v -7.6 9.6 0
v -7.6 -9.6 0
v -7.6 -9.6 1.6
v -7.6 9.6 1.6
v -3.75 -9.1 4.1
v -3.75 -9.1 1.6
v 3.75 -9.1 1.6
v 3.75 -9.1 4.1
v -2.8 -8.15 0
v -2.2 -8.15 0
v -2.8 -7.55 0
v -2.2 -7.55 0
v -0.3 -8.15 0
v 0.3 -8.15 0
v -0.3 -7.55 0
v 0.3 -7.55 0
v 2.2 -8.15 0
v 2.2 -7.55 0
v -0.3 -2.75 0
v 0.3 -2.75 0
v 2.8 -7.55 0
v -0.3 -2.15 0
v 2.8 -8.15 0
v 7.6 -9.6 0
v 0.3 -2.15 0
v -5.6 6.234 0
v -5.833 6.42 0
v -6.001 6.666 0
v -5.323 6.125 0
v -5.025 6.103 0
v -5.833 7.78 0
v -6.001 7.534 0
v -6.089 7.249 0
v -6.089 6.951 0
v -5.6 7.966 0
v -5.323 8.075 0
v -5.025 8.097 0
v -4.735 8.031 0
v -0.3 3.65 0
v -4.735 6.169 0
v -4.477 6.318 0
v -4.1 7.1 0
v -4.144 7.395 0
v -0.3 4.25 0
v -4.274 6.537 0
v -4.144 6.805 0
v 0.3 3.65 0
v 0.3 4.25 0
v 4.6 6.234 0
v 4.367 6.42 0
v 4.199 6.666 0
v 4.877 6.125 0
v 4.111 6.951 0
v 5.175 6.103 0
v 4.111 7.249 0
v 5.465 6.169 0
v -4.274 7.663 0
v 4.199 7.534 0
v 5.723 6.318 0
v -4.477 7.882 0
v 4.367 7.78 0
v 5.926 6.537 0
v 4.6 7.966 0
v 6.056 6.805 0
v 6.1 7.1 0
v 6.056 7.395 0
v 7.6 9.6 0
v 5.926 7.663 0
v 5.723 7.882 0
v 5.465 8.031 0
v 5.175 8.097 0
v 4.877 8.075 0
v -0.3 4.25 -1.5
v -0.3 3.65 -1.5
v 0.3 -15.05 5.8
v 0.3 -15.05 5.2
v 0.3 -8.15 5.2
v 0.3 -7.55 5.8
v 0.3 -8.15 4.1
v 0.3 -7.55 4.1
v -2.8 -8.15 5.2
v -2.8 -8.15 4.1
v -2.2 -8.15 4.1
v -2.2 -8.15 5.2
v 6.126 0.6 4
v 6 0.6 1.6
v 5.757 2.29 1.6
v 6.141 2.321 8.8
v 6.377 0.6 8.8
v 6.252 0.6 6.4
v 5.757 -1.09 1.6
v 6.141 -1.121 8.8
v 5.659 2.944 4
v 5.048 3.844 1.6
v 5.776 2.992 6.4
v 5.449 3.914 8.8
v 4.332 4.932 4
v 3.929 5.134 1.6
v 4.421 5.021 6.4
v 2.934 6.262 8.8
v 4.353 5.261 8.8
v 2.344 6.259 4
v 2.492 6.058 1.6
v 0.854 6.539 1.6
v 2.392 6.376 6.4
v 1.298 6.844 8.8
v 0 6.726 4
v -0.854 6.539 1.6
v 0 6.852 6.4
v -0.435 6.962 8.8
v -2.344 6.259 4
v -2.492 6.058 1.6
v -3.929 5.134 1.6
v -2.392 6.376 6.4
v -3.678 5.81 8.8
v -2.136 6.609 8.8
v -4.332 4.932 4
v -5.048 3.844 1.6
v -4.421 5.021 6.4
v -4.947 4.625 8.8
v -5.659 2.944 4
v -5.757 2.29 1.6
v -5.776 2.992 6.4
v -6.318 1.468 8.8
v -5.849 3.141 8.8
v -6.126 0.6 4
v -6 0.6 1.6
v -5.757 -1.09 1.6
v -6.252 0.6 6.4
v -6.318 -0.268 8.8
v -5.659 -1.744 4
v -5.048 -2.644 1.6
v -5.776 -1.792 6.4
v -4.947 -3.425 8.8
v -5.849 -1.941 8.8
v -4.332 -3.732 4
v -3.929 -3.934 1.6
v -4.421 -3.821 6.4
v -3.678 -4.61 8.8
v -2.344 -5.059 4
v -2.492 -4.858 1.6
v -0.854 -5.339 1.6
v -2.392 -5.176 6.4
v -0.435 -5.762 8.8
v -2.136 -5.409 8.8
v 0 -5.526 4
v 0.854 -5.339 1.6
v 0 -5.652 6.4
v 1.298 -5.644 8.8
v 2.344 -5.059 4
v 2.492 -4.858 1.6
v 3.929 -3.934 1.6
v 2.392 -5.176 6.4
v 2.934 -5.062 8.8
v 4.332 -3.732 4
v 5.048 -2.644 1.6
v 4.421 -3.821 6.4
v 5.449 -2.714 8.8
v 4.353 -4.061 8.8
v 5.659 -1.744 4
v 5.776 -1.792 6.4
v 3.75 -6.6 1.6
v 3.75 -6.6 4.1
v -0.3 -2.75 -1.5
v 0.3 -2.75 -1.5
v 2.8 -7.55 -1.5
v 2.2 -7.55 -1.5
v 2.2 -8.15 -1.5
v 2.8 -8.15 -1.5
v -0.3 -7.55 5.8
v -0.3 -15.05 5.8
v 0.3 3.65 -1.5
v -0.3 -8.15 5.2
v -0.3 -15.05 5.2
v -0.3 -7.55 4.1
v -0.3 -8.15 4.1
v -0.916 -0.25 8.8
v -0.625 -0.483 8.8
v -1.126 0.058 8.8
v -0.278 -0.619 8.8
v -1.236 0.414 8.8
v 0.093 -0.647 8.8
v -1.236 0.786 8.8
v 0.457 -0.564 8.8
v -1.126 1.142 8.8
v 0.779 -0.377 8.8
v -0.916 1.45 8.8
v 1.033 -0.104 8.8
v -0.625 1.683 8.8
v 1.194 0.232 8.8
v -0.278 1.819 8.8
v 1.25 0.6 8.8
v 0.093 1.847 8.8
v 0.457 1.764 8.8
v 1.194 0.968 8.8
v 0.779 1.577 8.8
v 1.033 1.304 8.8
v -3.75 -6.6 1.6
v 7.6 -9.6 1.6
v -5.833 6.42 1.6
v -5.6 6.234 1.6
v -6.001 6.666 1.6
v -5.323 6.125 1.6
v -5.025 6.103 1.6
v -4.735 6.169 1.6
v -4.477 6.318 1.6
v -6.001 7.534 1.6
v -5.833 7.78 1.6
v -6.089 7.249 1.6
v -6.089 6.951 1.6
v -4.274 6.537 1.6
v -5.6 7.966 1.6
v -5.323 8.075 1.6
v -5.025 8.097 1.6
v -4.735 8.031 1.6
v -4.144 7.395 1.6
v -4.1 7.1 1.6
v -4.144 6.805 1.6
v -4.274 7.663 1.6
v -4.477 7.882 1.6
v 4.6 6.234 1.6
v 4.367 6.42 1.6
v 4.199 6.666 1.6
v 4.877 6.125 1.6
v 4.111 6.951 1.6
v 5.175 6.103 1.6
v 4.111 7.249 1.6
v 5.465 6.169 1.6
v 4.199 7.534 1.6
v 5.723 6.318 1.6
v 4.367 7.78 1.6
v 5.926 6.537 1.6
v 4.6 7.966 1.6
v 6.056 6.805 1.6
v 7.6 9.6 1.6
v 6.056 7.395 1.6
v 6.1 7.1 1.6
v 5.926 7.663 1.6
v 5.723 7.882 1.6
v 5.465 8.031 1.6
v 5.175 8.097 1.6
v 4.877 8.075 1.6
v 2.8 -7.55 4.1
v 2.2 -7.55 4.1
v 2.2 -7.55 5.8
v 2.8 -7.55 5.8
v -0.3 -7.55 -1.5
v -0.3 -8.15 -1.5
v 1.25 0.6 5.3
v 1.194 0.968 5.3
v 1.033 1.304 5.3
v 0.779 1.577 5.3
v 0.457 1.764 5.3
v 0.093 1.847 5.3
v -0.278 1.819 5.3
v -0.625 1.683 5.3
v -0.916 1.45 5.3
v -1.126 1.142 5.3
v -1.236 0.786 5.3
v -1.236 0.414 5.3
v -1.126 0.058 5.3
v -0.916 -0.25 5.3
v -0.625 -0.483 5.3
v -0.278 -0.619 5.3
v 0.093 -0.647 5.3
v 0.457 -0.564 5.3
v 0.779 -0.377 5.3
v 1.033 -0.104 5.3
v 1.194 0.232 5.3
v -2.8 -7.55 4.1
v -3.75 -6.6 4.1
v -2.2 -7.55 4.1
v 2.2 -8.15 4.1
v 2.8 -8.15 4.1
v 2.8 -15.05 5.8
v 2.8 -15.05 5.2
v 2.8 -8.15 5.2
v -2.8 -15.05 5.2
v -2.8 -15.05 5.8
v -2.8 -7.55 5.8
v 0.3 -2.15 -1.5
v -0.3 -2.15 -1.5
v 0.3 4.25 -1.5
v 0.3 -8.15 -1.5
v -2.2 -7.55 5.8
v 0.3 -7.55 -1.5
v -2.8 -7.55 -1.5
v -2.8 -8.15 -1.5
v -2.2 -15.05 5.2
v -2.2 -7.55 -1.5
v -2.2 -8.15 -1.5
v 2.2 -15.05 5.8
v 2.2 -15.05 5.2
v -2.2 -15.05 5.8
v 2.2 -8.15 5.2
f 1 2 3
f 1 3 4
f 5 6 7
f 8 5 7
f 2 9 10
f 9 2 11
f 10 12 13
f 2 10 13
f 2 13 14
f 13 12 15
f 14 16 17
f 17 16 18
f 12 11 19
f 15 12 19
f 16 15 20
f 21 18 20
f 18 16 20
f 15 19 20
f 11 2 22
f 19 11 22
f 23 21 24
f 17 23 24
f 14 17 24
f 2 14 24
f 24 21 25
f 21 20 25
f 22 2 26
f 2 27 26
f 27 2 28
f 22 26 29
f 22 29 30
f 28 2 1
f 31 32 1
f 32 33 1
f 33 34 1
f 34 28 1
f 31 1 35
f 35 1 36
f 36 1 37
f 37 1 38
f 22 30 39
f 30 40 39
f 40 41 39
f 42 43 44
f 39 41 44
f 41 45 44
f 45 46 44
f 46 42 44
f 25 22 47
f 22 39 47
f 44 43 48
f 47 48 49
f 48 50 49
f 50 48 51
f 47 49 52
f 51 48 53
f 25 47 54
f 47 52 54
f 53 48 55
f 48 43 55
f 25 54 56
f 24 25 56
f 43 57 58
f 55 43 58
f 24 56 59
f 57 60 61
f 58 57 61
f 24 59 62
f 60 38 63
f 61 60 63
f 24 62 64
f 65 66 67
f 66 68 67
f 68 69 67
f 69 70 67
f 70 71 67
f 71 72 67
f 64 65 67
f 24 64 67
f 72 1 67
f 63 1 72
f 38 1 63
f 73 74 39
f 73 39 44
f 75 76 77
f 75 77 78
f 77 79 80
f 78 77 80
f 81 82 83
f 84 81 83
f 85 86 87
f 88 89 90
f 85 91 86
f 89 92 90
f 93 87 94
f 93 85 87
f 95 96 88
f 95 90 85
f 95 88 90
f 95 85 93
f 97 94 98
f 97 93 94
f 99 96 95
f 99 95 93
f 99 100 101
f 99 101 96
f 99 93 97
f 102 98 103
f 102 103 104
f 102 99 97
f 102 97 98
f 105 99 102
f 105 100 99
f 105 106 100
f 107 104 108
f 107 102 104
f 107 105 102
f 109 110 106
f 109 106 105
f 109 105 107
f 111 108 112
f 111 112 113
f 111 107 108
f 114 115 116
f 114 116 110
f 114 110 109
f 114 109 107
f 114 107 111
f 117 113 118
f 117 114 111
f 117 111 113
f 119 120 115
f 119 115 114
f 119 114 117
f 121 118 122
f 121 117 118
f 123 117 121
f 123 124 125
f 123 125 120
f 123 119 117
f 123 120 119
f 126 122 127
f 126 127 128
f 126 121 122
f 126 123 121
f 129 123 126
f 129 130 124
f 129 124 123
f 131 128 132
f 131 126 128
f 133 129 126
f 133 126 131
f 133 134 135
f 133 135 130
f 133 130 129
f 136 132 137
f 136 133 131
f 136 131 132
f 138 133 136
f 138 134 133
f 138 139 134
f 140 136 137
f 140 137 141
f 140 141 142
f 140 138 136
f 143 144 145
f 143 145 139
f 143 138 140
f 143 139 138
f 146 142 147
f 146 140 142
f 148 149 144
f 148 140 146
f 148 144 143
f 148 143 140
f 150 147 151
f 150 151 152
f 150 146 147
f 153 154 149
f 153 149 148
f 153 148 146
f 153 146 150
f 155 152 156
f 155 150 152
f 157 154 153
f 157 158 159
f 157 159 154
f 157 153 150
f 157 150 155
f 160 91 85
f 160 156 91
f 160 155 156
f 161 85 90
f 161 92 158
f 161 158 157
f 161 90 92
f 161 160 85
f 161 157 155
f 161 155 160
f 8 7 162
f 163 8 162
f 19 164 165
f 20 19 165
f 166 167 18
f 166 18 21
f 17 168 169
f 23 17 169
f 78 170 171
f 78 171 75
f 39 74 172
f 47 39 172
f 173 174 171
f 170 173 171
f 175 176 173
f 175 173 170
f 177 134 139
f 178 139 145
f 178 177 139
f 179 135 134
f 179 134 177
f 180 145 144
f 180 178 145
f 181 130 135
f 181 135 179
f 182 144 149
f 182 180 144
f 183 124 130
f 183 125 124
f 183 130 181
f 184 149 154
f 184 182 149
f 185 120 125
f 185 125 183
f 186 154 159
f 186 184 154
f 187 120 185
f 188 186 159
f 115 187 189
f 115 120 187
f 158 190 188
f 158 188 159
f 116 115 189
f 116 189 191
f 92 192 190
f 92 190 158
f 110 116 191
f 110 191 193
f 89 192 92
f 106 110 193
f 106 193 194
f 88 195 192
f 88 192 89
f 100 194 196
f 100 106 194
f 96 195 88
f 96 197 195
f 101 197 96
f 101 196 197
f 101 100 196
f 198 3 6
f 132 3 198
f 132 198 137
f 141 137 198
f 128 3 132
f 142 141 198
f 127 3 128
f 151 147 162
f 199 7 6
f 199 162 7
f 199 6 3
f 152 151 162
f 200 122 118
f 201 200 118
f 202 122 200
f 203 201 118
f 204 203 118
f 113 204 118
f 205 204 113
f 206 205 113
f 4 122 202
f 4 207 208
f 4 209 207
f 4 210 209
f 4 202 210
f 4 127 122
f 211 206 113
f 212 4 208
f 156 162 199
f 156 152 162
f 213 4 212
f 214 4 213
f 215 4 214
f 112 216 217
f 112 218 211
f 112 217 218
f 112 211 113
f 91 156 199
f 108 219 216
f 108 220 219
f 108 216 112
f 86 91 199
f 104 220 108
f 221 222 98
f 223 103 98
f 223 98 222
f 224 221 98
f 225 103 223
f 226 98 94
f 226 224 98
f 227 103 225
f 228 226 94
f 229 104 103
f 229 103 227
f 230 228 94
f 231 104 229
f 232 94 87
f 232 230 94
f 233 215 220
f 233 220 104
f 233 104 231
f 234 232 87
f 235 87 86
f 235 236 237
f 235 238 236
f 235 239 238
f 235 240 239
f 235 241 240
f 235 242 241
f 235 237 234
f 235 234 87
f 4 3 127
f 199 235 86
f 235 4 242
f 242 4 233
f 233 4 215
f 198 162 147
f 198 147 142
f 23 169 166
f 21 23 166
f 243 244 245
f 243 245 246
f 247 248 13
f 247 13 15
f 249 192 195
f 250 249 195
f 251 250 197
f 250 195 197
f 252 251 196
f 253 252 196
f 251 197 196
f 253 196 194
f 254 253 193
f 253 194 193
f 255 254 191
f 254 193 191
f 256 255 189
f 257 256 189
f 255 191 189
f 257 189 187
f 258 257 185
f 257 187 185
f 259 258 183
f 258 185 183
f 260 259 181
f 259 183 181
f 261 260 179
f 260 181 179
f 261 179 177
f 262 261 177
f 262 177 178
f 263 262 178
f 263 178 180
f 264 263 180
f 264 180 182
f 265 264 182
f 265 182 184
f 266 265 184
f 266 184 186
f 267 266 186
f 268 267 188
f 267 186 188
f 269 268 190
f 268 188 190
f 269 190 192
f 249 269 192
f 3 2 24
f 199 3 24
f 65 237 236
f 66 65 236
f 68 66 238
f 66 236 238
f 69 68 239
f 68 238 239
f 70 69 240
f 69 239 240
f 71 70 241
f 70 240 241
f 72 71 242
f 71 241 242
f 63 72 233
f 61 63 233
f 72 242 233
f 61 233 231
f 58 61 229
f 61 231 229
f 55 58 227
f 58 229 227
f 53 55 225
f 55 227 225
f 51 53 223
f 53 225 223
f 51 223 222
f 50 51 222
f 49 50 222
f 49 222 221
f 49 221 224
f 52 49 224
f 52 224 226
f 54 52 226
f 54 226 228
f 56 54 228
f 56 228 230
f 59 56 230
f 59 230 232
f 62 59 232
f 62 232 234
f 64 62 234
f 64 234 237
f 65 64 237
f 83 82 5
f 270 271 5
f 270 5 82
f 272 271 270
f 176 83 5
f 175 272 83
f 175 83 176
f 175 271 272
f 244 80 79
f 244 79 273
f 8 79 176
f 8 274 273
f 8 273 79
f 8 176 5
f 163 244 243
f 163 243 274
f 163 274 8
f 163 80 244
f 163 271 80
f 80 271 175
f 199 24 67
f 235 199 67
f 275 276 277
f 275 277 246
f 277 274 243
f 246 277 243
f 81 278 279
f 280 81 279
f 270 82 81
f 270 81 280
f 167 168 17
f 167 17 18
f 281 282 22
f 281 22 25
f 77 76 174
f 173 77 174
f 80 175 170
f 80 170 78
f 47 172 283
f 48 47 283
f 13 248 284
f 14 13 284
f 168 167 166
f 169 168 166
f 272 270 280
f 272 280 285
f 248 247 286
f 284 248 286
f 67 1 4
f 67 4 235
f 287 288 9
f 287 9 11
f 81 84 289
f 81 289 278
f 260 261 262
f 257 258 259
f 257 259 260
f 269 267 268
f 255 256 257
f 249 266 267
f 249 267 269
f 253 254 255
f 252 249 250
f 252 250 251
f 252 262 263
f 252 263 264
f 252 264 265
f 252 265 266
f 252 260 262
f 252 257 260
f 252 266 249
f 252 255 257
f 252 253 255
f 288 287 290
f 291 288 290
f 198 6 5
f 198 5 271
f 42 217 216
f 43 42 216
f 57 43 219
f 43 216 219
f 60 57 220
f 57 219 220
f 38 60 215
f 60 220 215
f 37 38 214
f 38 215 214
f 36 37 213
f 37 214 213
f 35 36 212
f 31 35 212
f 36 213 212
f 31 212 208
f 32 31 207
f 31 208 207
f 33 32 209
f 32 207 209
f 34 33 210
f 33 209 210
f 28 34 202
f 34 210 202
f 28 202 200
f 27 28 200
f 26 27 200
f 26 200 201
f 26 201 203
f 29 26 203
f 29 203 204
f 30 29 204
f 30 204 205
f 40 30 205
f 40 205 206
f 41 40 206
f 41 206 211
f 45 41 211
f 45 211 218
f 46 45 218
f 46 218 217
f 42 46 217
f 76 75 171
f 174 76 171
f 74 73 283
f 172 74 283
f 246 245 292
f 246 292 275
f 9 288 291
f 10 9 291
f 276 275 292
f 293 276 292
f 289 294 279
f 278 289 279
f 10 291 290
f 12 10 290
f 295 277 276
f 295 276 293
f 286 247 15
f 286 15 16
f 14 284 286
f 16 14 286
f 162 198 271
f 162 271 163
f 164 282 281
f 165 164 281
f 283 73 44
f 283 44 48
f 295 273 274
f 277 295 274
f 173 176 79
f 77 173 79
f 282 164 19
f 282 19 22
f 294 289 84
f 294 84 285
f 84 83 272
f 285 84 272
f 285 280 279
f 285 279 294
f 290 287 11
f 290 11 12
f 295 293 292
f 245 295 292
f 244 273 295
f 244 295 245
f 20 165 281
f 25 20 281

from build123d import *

# Parameters (mm, degrees)
F0_W      = 15.2
F0_H      = 19.2
F1_DEPTH  = 1.6
F2_R      = 6
F3_DEPTH  = 7.2
F3_TAPER  = -3
F4_R      = 1.25
F5_DEPTH  = 3.5
F6_R      = 1
F7_DEPTH  = 25
F8_W      = 7.5
F8_H      = 2.5
F9_DEPTH  = 2.5
F11_W     = 0.6
F11_H     = 0.6
F12_DEPTH = 7.3
F13_W     = 0.6
F13_H     = 0.6
F14_DEPTH = 7.5


with BuildPart() as f1:
    # F0 (on Top) → F1 (new body)
    with BuildSketch(Plane.XY):
        Rectangle(F0_W, F0_H)
    extrude(amount=F1_DEPTH)

    # F2 (on face) → F3 (join)
    with BuildSketch(Plane.XY.offset(1.6)):
        with Locations((0, 0.6)):
            Circle(F2_R)
    extrude(amount=F3_DEPTH, taper=F3_TAPER)

    # F4 (on face) → F5 (cut)
    with BuildSketch(Plane.XY.offset(8.8)):
        with Locations((0, 0.6)):
            Circle(F4_R)
    extrude(amount=-F5_DEPTH, mode=Mode.SUBTRACT)

    # F6 (on face) → F7 (cut)
    with BuildSketch(Plane.XY.offset(1.6)):
        with Locations((-5.1, 7.1)):
            Circle(F6_R)
        with Locations((5.1, 7.1)):
            Circle(F6_R)
    extrude(amount=-F7_DEPTH, mode=Mode.SUBTRACT)

    # F8 (on face) → F9 (join)
    with BuildSketch(Plane.XY.offset(1.6)):
        with Locations((0, -7.85)):
            Rectangle(F8_W, F8_H)
    extrude(amount=F9_DEPTH)

    # F11 (on offset) → F12 (join)
    with BuildSketch(Plane.XY.offset(-1.5)):
        with Locations((0, -7.85)):
            Rectangle(F11_W, F11_H)
        with Locations((2.4999999441, -7.85)):
            Rectangle(F11_W, F11_H)
        with Locations((-2.4999999441, -7.85)):
            Rectangle(F11_W, F11_H)
        with Locations((0, 3.95)):
            Rectangle(F11_W, F11_H)
        with Locations((0, -2.45)):
            Rectangle(F11_W, F11_H)
    extrude(amount=F12_DEPTH)

    # F13 (on face) → F14 (join)
    with BuildSketch(Plane(origin=(0, -7.55, 0), x_dir=(-1, 0, 0), z_dir=(0, 1, 0))):
        with Locations((2.4999999441, 5.5)):
            Rectangle(F13_W, F13_H)
        Polygon((0.3, 5.8), (0, 5.8), (-0.3, 5.8), (-0.3, 5.2), (0, 5.2), (0.3, 5.2), align=None)
        with Locations((-2.4999999441, 5.5)):
            Rectangle(F13_W, F13_H)
    extrude(amount=-F14_DEPTH)


solid = f1.part
